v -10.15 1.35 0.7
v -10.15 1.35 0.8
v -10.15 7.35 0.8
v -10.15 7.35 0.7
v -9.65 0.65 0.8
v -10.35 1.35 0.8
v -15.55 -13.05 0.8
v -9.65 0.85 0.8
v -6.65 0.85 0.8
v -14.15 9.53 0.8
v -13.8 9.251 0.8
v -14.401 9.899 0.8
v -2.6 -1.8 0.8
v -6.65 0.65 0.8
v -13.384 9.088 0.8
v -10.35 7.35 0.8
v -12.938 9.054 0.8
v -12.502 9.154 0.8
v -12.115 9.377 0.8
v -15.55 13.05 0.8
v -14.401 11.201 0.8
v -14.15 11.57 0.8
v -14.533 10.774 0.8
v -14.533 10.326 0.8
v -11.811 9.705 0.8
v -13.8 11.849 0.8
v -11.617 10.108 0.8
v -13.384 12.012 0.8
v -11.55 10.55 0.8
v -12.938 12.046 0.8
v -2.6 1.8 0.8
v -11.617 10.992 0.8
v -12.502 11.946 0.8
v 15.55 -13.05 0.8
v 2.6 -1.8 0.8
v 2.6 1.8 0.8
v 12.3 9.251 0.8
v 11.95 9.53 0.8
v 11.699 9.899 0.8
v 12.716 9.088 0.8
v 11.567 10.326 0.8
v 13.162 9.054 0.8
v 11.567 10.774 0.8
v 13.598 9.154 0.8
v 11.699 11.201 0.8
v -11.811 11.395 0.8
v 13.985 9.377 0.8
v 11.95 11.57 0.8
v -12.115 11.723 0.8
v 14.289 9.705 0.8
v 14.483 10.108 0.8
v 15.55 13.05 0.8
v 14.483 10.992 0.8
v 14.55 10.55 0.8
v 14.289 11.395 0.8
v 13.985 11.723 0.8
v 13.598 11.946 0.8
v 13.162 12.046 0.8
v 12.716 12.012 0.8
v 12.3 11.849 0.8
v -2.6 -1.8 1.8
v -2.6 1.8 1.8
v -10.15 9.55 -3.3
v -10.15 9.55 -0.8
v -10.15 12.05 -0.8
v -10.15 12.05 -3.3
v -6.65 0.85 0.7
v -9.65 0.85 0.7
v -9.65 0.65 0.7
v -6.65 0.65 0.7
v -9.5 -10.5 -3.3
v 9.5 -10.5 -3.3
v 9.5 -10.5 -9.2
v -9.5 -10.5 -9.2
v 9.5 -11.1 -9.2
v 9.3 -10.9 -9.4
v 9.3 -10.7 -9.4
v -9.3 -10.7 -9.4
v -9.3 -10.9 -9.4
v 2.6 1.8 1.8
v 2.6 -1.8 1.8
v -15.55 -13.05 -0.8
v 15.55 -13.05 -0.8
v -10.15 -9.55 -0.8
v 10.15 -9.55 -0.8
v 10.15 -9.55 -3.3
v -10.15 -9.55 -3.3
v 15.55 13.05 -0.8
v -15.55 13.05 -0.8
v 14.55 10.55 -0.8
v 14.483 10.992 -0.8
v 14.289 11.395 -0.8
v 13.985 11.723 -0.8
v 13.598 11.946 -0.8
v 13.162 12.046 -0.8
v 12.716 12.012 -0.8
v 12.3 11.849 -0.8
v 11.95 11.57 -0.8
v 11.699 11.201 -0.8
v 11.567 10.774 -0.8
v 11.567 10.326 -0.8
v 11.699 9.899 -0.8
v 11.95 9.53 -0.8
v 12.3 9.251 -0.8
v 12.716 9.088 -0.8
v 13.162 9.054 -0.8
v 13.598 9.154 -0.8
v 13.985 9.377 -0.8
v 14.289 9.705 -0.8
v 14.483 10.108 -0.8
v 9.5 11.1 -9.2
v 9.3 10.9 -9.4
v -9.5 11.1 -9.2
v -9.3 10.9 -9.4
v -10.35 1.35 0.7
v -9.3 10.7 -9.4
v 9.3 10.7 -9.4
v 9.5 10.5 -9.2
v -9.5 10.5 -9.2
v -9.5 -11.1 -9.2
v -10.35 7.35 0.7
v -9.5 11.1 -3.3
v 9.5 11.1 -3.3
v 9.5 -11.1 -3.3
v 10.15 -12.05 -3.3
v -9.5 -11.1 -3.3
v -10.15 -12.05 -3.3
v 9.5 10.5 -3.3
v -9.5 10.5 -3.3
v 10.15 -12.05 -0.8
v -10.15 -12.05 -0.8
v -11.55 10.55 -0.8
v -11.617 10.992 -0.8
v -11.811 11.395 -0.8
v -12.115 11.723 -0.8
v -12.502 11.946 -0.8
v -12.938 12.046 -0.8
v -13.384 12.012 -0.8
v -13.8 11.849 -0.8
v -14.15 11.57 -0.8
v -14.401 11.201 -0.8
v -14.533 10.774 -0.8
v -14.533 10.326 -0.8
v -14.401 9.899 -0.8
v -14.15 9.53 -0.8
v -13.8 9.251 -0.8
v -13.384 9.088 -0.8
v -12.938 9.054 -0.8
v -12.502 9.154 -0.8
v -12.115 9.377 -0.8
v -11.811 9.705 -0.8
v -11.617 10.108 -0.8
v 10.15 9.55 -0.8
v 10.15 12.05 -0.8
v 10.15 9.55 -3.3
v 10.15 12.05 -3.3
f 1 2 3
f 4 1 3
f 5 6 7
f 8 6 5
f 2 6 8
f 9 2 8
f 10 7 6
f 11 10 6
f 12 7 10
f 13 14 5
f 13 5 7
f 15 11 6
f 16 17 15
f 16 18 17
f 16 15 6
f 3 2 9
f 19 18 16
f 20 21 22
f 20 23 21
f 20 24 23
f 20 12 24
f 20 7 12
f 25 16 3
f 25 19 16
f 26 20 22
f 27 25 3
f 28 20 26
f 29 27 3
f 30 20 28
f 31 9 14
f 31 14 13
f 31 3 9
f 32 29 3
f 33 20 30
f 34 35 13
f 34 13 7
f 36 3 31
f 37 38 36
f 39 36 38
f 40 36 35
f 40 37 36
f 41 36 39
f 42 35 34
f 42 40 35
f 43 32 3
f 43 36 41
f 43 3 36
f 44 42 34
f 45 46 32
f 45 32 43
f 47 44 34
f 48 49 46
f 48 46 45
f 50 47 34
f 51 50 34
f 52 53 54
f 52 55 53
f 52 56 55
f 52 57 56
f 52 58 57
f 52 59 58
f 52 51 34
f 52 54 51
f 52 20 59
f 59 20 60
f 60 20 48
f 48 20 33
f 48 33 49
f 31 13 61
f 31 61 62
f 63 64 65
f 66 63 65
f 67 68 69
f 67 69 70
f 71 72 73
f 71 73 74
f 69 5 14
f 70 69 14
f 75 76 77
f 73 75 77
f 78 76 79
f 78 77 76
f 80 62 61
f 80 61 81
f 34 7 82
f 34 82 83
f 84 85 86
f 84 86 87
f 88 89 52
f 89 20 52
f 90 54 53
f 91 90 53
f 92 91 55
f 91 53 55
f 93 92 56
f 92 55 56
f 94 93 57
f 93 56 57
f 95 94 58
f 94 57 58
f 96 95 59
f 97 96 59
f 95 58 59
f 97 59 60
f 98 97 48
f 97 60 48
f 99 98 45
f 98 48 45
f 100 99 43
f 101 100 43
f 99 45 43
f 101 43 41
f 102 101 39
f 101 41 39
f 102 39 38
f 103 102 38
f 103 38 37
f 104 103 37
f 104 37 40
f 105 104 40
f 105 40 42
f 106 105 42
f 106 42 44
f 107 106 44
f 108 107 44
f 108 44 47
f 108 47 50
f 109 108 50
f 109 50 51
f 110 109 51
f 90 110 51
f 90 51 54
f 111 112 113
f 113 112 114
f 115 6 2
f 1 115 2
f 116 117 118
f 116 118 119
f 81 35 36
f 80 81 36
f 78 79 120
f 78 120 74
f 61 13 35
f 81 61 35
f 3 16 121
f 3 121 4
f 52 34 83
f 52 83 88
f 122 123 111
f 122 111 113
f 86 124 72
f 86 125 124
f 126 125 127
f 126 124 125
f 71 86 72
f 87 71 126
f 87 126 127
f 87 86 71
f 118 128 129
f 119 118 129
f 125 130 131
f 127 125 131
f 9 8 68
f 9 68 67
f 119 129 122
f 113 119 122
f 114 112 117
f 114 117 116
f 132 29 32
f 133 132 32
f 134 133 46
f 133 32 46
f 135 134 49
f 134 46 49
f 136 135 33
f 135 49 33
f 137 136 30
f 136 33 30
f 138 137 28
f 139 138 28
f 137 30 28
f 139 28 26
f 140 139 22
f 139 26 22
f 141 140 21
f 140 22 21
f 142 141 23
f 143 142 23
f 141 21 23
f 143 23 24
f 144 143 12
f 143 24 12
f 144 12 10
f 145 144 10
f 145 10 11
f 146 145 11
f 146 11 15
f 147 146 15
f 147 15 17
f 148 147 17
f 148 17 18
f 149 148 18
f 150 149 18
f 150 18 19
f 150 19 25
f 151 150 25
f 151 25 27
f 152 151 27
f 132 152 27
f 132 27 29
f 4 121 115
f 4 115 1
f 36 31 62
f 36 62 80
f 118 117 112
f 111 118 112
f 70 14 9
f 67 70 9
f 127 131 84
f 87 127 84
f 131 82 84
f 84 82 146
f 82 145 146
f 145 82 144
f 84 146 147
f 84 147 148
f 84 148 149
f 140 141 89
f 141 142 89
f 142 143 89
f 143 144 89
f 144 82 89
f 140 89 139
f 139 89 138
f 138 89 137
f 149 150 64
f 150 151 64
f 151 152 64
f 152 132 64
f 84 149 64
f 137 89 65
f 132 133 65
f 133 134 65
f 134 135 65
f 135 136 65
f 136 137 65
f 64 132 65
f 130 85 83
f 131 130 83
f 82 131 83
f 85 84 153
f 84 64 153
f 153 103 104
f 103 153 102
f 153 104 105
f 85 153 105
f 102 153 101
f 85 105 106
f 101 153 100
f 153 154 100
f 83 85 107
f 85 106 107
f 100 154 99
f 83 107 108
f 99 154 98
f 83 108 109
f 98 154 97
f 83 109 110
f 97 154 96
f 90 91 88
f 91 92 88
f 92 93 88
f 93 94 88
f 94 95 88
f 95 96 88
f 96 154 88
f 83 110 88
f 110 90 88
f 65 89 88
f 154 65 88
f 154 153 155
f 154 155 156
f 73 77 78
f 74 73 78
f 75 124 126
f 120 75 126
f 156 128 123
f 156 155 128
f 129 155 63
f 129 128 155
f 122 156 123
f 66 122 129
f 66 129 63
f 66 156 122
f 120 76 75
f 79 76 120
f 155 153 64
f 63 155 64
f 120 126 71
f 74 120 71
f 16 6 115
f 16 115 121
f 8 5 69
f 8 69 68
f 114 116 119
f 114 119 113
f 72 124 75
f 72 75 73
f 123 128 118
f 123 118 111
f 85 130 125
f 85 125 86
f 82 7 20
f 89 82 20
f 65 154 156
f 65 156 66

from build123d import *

# Parameters (mm, degrees)
SKETCH1_W           = 31.1
SKETCH1_H           = 26.1
BOSS_EXTRUDE1_DEPTH = 0.8
SKETCH2_W           = 20.3
SKETCH2_H           = 2.5
BOSS_EXTRUDE2_DEPTH = 2.5
SKETCH3_W           = 19
SKETCH3_H           = 0.6
BOSS_EXTRUDE3_DEPTH = 6.1
CHAMFER1_SIZE       = 0.2
SKETCH4_W           = 5.2
SKETCH4_H           = 3.6
BOSS_EXTRUDE4_DEPTH = 1
SKETCH5_W           = 0.2
SKETCH5_H           = 6
SKETCH5_W_2         = 3
SKETCH5_H_2         = 0.2
CUT_EXTRUDE1_DEPTH  = 0.1
SKETCH6_R           = 1.5
CUT_EXTRUDE2_DEPTH  = 23.718824794


with BuildPart() as part:
    # Sketch1 → Boss-Extrude1 (new, symmetric)
    with BuildSketch(Plane.XY):
        Rectangle(SKETCH1_W, SKETCH1_H)
    extrude(amount=BOSS_EXTRUDE1_DEPTH, both=True)

    # Sketch2 → Boss-Extrude2 (add)
    with BuildSketch(Plane(origin=(0, 0, -0.8), x_dir=(-1, 0, 0), z_dir=(0, 0, -1))):
        with Locations((0, -10.8)):
            Rectangle(SKETCH2_W, SKETCH2_H)
        with Locations((0, 10.8)):
            Rectangle(SKETCH2_W, SKETCH2_H)
    extrude(amount=BOSS_EXTRUDE2_DEPTH)

    # Sketch3 → Boss-Extrude3 (add)
    with BuildSketch(Plane(origin=(0, 0, -3.3), x_dir=(-1, 0, 0), z_dir=(0, 0, -1))):
        with Locations((0, 10.8)):
            Rectangle(SKETCH3_W, SKETCH3_H)
        with Locations((0, -10.8)):
            Rectangle(SKETCH3_W, SKETCH3_H)
    extrude(amount=BOSS_EXTRUDE3_DEPTH)

    # Chamfer1
    chamfer1_edges = [part.edges().sort_by_distance(p)[0] for p in [
        (9.5, 10.8, -9.4),
        (0, 10.5, -9.4),
        (-9.5, 10.8, -9.4),
        (0, 11.1, -9.4),
        (0, -11.1, -9.4),
        (-9.5, -10.8, -9.4),
        (0, -10.5, -9.4),
        (9.5, -10.8, -9.4),
    ]]
    chamfer(chamfer1_edges, length=CHAMFER1_SIZE)

    # Sketch4 → Boss-Extrude4 (add)
    with BuildSketch(Plane.XY.offset(0.8)):
        Rectangle(SKETCH4_W, SKETCH4_H)
    extrude(amount=BOSS_EXTRUDE4_DEPTH)

    # Sketch5 → Cut-Extrude1 (cut)
    with BuildSketch(Plane.XY.offset(0.8)):
        with Locations((-10.25, 4.35)):
            Rectangle(SKETCH5_W, SKETCH5_H)
        with Locations((-8.15, 0.75)):
            Rectangle(SKETCH5_W_2, SKETCH5_H_2)
    extrude(amount=-CUT_EXTRUDE1_DEPTH, mode=Mode.SUBTRACT)

    # Sketch6 → Cut-Extrude2 (cut, through all)
    with BuildSketch(Plane.XY.offset(0.8)):
        with Locations((-13.05, 10.55)):
            Circle(SKETCH6_R)
        with Locations((13.05, 10.55)):
            Circle(SKETCH6_R)
    extrude(amount=-CUT_EXTRUDE2_DEPTH, mode=Mode.SUBTRACT)


solid = part.part
